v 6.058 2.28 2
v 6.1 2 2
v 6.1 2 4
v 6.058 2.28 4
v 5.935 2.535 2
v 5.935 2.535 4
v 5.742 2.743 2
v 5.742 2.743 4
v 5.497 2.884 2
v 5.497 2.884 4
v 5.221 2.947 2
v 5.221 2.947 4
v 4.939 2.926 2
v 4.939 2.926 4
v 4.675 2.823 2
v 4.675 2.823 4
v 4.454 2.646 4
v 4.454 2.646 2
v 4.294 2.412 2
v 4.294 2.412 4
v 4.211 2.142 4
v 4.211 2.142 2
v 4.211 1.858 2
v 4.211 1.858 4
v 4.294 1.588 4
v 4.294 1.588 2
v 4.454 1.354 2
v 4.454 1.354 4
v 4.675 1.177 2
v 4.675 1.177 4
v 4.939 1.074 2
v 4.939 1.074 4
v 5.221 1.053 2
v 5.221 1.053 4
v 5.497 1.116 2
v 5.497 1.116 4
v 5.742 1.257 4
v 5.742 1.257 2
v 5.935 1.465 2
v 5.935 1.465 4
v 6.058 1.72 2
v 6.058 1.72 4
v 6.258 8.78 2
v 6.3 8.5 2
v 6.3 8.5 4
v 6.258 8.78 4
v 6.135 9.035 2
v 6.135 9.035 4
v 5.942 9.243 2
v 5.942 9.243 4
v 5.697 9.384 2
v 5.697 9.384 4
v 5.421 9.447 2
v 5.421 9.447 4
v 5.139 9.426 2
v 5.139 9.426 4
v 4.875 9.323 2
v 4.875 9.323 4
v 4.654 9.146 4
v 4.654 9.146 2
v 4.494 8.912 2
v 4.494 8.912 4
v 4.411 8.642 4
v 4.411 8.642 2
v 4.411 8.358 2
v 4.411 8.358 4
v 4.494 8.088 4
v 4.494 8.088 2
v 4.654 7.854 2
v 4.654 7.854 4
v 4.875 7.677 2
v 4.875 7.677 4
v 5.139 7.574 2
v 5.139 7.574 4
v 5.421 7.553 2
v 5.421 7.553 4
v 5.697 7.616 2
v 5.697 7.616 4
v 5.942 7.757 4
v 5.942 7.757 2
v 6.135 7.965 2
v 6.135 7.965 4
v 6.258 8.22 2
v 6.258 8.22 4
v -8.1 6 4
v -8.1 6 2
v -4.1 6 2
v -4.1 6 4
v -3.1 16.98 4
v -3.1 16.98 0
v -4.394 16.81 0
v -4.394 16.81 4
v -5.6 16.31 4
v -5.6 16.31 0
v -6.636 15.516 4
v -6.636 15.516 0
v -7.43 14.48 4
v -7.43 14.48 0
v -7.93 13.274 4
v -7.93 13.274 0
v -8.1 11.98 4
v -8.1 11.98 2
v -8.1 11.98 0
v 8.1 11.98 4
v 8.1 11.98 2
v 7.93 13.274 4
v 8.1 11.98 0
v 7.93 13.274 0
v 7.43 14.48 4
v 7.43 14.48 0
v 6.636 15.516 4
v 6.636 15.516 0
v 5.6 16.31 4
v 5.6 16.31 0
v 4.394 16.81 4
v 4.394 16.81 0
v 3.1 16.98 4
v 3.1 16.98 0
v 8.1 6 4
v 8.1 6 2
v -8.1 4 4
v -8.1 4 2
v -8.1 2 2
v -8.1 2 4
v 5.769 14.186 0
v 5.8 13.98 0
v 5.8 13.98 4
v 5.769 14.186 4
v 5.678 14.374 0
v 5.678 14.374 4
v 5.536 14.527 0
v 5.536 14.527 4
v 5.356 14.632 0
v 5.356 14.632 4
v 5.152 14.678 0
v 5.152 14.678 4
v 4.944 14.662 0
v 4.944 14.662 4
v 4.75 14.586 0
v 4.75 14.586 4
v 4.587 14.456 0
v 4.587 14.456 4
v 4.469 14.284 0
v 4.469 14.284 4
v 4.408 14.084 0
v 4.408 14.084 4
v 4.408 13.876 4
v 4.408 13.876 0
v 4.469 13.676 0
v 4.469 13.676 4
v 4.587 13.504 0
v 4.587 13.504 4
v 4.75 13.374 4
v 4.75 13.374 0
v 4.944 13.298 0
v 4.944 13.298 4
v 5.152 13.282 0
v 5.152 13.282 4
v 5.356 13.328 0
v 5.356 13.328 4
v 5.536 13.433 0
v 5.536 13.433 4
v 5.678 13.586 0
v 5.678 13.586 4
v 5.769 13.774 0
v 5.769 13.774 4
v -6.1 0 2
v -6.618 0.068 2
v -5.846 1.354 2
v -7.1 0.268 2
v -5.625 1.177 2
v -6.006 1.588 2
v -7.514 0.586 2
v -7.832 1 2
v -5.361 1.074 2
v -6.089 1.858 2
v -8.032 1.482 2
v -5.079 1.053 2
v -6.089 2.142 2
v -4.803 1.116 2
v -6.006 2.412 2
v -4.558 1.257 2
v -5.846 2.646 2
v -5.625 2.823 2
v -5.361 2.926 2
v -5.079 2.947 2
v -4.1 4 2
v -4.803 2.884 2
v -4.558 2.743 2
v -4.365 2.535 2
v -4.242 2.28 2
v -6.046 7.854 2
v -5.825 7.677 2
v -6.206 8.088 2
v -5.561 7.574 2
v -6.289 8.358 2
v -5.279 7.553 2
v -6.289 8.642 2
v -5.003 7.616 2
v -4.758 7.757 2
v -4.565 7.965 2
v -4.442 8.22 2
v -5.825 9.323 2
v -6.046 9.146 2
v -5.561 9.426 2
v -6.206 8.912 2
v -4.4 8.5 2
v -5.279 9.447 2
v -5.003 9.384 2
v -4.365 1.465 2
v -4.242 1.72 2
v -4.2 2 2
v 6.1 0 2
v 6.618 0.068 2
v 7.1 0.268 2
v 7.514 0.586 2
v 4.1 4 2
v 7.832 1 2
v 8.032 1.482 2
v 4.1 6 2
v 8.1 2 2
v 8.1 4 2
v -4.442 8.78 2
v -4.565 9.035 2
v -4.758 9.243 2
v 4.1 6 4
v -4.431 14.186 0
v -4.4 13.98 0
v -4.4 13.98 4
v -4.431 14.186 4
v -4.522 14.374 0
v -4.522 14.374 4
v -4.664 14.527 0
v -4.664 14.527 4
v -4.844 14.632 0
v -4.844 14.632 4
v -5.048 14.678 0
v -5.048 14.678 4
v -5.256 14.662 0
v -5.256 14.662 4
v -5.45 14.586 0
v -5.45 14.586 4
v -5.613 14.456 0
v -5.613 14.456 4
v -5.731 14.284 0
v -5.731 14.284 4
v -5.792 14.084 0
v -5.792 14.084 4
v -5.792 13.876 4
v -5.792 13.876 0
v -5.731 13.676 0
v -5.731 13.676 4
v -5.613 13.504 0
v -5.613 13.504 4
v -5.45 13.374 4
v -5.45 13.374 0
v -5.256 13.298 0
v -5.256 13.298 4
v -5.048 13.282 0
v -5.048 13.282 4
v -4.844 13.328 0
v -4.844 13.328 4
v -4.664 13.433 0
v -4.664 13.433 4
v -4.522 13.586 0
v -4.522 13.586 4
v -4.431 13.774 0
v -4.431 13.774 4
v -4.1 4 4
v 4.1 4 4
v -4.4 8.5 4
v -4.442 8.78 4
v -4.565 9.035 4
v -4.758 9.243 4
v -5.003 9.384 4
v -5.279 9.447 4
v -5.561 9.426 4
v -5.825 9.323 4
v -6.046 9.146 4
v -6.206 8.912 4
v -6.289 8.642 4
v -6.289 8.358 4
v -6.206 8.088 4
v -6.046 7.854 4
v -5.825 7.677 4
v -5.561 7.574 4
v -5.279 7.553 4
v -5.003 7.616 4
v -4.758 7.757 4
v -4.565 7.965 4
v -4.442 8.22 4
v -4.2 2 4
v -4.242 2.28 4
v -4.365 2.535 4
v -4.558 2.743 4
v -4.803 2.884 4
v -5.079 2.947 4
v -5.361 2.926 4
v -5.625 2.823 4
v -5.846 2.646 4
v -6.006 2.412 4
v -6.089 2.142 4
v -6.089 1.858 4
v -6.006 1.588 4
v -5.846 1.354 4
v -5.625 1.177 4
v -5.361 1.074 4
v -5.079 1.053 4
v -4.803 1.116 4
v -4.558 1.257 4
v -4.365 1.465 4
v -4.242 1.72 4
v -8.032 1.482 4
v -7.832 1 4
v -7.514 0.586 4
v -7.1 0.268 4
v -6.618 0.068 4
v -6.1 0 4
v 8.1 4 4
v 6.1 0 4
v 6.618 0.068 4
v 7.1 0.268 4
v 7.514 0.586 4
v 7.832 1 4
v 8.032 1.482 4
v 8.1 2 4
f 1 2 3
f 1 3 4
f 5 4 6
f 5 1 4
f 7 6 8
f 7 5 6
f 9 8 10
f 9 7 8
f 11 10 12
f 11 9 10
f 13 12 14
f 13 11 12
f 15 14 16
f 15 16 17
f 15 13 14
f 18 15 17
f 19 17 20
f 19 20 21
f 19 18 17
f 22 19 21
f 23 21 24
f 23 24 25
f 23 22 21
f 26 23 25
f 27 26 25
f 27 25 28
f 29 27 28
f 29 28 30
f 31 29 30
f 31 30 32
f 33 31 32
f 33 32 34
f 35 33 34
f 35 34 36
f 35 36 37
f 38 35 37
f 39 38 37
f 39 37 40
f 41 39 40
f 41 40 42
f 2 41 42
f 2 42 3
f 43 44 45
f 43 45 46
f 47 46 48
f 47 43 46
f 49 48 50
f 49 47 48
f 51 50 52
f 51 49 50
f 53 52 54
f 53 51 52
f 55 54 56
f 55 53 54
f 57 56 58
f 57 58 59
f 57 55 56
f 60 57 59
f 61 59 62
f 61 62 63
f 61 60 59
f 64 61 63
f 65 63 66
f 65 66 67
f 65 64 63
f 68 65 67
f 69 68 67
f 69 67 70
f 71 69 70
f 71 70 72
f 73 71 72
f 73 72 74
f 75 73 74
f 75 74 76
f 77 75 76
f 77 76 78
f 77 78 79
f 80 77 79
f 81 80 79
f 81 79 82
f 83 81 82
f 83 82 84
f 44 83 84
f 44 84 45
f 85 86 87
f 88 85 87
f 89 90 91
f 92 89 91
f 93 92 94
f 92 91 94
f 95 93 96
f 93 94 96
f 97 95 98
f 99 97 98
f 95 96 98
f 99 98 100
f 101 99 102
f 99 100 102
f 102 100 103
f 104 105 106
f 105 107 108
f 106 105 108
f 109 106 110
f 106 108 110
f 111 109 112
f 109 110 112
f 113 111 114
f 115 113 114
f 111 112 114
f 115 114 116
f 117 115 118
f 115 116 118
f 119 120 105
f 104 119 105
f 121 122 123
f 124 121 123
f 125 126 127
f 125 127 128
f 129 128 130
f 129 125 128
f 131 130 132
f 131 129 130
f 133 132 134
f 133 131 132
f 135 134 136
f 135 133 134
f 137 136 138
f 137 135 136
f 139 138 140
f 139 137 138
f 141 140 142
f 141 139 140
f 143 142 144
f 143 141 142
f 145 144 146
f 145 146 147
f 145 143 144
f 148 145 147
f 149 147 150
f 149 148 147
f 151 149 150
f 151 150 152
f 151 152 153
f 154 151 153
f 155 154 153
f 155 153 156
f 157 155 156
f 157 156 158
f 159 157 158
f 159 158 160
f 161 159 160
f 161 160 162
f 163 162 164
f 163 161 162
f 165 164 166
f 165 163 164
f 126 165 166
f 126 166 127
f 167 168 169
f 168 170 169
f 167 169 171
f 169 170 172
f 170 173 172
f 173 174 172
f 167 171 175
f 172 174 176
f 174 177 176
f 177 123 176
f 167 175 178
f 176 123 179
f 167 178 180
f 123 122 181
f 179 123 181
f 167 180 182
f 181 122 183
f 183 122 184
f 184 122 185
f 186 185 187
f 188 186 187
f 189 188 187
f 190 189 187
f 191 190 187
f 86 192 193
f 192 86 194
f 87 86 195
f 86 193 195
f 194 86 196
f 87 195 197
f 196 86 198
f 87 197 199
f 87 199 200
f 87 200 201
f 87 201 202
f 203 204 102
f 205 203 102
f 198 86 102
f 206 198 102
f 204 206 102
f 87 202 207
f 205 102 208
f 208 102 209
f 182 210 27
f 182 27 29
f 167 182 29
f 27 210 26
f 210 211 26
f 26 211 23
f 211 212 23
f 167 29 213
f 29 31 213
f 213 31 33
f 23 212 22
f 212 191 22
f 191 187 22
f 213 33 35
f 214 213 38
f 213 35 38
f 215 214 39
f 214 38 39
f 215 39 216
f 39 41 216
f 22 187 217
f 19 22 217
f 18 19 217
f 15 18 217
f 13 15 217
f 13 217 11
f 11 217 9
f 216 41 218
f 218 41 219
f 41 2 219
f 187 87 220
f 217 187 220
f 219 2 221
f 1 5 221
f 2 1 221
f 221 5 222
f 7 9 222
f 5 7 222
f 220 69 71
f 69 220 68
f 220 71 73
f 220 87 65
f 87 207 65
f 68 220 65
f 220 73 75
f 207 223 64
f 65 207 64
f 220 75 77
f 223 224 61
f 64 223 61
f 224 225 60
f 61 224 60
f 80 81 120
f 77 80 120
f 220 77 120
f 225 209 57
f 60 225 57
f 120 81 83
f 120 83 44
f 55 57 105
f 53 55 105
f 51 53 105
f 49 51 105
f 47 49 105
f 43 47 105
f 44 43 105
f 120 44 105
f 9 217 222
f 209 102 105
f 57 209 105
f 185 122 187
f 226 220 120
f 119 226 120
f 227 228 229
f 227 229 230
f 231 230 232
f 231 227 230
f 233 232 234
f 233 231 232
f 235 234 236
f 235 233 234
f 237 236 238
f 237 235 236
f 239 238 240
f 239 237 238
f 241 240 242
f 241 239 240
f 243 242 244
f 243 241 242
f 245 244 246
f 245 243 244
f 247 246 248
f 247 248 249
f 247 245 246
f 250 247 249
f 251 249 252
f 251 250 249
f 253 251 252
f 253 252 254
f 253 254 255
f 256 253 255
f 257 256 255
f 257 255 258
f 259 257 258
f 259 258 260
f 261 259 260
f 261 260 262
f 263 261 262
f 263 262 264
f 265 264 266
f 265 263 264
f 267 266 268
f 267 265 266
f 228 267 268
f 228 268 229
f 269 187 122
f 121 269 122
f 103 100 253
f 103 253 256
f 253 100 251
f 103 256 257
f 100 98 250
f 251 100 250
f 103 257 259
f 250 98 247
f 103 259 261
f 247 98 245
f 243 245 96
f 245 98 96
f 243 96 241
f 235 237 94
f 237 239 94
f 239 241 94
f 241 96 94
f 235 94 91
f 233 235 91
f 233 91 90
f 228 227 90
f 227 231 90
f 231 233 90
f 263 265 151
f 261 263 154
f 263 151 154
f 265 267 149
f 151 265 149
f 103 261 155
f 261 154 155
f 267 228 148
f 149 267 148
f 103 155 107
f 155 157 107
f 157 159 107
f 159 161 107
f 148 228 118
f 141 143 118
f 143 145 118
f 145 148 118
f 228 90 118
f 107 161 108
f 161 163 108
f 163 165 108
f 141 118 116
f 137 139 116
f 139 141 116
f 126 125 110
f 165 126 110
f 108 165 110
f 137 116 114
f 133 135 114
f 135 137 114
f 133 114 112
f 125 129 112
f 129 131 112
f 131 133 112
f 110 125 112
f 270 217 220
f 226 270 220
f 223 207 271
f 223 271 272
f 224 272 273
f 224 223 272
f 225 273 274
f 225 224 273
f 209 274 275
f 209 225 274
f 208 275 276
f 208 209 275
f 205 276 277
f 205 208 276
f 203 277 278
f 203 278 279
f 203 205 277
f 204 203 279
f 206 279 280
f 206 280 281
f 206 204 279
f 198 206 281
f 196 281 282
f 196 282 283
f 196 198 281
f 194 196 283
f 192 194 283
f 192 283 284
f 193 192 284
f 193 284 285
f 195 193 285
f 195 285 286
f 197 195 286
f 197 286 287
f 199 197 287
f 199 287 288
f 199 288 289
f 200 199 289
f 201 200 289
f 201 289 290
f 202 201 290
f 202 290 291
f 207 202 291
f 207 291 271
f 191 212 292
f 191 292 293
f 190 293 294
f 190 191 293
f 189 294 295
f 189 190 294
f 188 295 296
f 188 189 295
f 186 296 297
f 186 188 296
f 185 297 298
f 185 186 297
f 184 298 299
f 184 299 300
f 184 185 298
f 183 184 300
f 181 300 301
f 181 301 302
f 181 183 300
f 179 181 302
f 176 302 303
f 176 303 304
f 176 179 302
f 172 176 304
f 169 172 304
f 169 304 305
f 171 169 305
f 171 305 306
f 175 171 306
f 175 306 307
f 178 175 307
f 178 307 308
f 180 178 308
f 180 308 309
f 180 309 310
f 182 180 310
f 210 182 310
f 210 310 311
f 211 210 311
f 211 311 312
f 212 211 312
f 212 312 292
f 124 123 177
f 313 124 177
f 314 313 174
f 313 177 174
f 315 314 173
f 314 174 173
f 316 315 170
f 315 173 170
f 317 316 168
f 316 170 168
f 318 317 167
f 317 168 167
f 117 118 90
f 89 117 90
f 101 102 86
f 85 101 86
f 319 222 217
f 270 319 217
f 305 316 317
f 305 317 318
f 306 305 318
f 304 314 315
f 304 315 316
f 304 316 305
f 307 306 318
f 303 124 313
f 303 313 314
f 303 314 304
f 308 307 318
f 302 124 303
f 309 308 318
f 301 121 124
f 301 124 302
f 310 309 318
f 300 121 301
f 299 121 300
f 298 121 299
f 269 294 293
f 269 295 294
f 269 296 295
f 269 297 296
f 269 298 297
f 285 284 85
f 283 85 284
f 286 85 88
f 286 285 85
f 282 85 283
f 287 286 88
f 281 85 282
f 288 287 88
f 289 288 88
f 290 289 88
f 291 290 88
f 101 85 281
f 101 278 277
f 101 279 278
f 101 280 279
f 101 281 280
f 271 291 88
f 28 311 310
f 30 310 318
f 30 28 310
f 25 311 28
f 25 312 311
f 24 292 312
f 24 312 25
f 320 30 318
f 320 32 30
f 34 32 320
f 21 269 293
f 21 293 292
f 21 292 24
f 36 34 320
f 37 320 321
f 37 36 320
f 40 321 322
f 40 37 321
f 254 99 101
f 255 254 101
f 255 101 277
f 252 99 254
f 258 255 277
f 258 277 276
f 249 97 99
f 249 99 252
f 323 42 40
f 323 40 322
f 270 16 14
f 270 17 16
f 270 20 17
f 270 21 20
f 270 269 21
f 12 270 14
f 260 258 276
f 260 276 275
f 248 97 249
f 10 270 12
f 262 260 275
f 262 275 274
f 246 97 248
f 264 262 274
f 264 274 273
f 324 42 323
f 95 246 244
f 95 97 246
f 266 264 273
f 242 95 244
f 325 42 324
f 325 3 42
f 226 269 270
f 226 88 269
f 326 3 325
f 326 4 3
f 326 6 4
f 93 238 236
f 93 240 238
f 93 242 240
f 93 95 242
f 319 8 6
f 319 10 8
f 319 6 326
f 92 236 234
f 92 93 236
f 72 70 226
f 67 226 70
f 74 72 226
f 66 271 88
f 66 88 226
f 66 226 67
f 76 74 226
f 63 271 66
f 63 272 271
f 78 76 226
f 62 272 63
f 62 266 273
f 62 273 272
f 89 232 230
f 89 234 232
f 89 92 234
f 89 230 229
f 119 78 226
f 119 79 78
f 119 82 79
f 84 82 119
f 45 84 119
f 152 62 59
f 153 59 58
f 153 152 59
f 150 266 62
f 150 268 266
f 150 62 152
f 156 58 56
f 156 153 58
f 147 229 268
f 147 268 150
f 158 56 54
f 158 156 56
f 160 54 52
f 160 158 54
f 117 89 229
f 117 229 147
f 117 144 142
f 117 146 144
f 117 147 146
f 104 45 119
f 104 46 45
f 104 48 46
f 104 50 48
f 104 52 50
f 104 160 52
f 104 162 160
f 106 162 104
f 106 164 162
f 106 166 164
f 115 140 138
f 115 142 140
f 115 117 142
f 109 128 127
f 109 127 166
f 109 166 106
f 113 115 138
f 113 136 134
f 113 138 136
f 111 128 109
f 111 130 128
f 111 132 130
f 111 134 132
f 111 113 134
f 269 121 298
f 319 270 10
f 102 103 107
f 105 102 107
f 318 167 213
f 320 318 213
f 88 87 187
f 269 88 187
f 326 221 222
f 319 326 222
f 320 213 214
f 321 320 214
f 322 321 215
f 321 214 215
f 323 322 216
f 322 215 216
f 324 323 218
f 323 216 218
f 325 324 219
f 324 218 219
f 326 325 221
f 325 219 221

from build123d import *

# Parameters (mm, degrees)
SKETCH1_R           = 0.95
SKETCH1_R_2         = 0.7
BOSS_EXTRUDE1_DEPTH = 4
SKETCH2_W           = 16.2
SKETCH2_H           = 11.98
CUT_EXTRUDE1_DEPTH  = 2


with BuildPart() as part:
    # Sketch1 → Boss-Extrude1 (new body)
    with BuildSketch(Plane.XY):
        with BuildLine():
            Line((3.1, 16.98), (-3.1, 16.98))
            ThreePointArc((-3.1, 16.98), (-6.635533906, 15.515533906), (-8.1, 11.98))
            Line((-8.1, 11.98), (-8.1, 6))
            Line((-8.1, 6), (-4.1, 6))
            Line((-4.1, 6), (-4.1, 4))
            Line((-4.1, 4), (-8.1, 4))
            Line((-8.1, 4), (-8.1, 2))
            ThreePointArc((-8.1, 2), (-7.514213562, 0.585786438), (-6.1, 0))
            Line((-6.1, 0), (6.1, 0))
            ThreePointArc((6.1, 0), (7.514213562, 0.585786438), (8.1, 2))
            Line((8.1, 2), (8.1, 4))
            Line((8.1, 4), (4.1, 4))
            Line((4.1, 4), (4.1, 6))
            Line((4.1, 6), (8.1, 6))
            Line((8.1, 6), (8.1, 11.98))
            ThreePointArc((8.1, 11.98), (6.635533906, 15.515533906), (3.1, 16.98))
        make_face()
        with Locations((-5.15, 2)):
            Circle(SKETCH1_R, mode=Mode.SUBTRACT)
        with Locations((-5.1, 13.98)):
            Circle(SKETCH1_R_2, mode=Mode.SUBTRACT)
        with Locations((-5.35, 8.5)):
            Circle(SKETCH1_R, mode=Mode.SUBTRACT)
        with Locations((5.35, 8.5)):
            Circle(SKETCH1_R, mode=Mode.SUBTRACT)
        with Locations((5.1, 13.98)):
            Circle(SKETCH1_R_2, mode=Mode.SUBTRACT)
        with Locations((5.15, 2)):
            Circle(SKETCH1_R, mode=Mode.SUBTRACT)
    extrude(amount=BOSS_EXTRUDE1_DEPTH)

    # Sketch2 → Cut-Extrude1 (cut)
    with BuildSketch(Plane.XY):
        with Locations((0, 5.99)):
            Rectangle(SKETCH2_W, SKETCH2_H)
    extrude(amount=CUT_EXTRUDE1_DEPTH, mode=Mode.SUBTRACT)


solid = part.part
